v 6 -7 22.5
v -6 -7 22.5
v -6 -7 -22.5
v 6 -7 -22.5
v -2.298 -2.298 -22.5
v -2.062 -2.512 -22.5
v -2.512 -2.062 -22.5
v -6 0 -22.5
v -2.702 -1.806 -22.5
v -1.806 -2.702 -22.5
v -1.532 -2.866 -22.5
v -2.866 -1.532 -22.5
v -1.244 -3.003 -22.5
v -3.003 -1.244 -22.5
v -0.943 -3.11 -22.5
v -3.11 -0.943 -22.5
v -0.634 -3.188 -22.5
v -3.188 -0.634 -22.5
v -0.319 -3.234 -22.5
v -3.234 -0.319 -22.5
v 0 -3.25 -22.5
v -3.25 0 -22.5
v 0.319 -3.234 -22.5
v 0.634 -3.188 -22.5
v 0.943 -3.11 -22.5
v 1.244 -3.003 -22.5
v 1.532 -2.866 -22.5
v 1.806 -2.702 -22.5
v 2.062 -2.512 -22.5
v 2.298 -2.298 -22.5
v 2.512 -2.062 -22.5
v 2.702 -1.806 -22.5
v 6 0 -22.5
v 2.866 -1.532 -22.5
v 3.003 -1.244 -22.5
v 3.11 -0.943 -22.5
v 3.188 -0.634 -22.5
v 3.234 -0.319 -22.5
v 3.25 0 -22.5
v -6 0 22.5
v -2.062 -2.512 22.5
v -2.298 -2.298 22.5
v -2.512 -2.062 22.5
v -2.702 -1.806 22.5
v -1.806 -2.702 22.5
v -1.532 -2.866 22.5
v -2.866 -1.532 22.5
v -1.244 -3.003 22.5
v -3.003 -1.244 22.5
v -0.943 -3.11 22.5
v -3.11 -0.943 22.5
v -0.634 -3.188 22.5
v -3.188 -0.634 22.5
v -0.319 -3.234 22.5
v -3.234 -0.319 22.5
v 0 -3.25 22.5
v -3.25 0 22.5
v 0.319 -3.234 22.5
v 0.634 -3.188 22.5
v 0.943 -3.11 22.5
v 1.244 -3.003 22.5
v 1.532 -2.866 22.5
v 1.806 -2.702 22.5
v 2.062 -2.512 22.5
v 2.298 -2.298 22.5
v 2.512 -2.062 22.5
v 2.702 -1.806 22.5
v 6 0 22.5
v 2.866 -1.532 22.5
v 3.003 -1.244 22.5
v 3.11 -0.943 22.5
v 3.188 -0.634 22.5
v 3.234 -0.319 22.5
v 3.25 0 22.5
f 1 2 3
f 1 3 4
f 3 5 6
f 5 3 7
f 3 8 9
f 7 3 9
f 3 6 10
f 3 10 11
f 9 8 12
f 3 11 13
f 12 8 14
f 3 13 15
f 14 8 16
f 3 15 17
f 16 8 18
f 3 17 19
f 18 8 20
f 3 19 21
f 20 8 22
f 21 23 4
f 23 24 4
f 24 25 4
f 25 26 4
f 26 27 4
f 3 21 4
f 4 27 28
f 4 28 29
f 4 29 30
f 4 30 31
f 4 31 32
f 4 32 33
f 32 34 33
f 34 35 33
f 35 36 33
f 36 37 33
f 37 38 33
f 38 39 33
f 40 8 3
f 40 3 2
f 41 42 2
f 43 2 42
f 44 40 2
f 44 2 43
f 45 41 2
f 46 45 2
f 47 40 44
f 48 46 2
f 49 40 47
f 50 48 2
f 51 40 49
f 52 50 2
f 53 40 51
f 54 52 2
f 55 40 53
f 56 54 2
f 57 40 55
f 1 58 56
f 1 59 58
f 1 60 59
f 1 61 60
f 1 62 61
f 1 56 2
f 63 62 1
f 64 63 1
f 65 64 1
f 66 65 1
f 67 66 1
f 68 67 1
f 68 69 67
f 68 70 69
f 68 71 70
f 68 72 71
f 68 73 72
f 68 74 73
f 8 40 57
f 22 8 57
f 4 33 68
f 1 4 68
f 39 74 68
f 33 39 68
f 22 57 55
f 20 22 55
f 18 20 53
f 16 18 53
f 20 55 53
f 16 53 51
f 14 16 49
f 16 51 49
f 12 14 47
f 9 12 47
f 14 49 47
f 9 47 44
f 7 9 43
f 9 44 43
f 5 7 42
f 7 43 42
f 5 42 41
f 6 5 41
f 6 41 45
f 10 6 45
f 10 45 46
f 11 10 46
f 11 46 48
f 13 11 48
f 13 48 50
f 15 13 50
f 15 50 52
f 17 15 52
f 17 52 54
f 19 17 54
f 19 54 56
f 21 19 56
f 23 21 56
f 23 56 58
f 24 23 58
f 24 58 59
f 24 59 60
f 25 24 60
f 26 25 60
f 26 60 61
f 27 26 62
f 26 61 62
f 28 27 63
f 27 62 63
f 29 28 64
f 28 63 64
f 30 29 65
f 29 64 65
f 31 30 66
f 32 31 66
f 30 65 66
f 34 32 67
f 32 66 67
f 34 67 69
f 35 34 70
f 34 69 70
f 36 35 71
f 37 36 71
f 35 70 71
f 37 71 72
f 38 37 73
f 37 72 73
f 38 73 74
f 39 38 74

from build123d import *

# Parameters (mm, degrees)
F0_W     = 12
F0_H     = 45
F1_DEPTH = 7
F2_R     = 3.25
F3_DEPTH = 45.001


with BuildPart() as f1:
    # F0 (on Front) → F1 (new body)
    with BuildSketch(Plane.XZ):
        Rectangle(F0_W, F0_H)
    extrude(amount=F1_DEPTH)

    # F2 (on face) → F3 (cut, through all)
    with BuildSketch(Plane.XY.offset(22.5)):
        Circle(F2_R)
    extrude(amount=-F3_DEPTH, mode=Mode.SUBTRACT)


solid = f1.part
